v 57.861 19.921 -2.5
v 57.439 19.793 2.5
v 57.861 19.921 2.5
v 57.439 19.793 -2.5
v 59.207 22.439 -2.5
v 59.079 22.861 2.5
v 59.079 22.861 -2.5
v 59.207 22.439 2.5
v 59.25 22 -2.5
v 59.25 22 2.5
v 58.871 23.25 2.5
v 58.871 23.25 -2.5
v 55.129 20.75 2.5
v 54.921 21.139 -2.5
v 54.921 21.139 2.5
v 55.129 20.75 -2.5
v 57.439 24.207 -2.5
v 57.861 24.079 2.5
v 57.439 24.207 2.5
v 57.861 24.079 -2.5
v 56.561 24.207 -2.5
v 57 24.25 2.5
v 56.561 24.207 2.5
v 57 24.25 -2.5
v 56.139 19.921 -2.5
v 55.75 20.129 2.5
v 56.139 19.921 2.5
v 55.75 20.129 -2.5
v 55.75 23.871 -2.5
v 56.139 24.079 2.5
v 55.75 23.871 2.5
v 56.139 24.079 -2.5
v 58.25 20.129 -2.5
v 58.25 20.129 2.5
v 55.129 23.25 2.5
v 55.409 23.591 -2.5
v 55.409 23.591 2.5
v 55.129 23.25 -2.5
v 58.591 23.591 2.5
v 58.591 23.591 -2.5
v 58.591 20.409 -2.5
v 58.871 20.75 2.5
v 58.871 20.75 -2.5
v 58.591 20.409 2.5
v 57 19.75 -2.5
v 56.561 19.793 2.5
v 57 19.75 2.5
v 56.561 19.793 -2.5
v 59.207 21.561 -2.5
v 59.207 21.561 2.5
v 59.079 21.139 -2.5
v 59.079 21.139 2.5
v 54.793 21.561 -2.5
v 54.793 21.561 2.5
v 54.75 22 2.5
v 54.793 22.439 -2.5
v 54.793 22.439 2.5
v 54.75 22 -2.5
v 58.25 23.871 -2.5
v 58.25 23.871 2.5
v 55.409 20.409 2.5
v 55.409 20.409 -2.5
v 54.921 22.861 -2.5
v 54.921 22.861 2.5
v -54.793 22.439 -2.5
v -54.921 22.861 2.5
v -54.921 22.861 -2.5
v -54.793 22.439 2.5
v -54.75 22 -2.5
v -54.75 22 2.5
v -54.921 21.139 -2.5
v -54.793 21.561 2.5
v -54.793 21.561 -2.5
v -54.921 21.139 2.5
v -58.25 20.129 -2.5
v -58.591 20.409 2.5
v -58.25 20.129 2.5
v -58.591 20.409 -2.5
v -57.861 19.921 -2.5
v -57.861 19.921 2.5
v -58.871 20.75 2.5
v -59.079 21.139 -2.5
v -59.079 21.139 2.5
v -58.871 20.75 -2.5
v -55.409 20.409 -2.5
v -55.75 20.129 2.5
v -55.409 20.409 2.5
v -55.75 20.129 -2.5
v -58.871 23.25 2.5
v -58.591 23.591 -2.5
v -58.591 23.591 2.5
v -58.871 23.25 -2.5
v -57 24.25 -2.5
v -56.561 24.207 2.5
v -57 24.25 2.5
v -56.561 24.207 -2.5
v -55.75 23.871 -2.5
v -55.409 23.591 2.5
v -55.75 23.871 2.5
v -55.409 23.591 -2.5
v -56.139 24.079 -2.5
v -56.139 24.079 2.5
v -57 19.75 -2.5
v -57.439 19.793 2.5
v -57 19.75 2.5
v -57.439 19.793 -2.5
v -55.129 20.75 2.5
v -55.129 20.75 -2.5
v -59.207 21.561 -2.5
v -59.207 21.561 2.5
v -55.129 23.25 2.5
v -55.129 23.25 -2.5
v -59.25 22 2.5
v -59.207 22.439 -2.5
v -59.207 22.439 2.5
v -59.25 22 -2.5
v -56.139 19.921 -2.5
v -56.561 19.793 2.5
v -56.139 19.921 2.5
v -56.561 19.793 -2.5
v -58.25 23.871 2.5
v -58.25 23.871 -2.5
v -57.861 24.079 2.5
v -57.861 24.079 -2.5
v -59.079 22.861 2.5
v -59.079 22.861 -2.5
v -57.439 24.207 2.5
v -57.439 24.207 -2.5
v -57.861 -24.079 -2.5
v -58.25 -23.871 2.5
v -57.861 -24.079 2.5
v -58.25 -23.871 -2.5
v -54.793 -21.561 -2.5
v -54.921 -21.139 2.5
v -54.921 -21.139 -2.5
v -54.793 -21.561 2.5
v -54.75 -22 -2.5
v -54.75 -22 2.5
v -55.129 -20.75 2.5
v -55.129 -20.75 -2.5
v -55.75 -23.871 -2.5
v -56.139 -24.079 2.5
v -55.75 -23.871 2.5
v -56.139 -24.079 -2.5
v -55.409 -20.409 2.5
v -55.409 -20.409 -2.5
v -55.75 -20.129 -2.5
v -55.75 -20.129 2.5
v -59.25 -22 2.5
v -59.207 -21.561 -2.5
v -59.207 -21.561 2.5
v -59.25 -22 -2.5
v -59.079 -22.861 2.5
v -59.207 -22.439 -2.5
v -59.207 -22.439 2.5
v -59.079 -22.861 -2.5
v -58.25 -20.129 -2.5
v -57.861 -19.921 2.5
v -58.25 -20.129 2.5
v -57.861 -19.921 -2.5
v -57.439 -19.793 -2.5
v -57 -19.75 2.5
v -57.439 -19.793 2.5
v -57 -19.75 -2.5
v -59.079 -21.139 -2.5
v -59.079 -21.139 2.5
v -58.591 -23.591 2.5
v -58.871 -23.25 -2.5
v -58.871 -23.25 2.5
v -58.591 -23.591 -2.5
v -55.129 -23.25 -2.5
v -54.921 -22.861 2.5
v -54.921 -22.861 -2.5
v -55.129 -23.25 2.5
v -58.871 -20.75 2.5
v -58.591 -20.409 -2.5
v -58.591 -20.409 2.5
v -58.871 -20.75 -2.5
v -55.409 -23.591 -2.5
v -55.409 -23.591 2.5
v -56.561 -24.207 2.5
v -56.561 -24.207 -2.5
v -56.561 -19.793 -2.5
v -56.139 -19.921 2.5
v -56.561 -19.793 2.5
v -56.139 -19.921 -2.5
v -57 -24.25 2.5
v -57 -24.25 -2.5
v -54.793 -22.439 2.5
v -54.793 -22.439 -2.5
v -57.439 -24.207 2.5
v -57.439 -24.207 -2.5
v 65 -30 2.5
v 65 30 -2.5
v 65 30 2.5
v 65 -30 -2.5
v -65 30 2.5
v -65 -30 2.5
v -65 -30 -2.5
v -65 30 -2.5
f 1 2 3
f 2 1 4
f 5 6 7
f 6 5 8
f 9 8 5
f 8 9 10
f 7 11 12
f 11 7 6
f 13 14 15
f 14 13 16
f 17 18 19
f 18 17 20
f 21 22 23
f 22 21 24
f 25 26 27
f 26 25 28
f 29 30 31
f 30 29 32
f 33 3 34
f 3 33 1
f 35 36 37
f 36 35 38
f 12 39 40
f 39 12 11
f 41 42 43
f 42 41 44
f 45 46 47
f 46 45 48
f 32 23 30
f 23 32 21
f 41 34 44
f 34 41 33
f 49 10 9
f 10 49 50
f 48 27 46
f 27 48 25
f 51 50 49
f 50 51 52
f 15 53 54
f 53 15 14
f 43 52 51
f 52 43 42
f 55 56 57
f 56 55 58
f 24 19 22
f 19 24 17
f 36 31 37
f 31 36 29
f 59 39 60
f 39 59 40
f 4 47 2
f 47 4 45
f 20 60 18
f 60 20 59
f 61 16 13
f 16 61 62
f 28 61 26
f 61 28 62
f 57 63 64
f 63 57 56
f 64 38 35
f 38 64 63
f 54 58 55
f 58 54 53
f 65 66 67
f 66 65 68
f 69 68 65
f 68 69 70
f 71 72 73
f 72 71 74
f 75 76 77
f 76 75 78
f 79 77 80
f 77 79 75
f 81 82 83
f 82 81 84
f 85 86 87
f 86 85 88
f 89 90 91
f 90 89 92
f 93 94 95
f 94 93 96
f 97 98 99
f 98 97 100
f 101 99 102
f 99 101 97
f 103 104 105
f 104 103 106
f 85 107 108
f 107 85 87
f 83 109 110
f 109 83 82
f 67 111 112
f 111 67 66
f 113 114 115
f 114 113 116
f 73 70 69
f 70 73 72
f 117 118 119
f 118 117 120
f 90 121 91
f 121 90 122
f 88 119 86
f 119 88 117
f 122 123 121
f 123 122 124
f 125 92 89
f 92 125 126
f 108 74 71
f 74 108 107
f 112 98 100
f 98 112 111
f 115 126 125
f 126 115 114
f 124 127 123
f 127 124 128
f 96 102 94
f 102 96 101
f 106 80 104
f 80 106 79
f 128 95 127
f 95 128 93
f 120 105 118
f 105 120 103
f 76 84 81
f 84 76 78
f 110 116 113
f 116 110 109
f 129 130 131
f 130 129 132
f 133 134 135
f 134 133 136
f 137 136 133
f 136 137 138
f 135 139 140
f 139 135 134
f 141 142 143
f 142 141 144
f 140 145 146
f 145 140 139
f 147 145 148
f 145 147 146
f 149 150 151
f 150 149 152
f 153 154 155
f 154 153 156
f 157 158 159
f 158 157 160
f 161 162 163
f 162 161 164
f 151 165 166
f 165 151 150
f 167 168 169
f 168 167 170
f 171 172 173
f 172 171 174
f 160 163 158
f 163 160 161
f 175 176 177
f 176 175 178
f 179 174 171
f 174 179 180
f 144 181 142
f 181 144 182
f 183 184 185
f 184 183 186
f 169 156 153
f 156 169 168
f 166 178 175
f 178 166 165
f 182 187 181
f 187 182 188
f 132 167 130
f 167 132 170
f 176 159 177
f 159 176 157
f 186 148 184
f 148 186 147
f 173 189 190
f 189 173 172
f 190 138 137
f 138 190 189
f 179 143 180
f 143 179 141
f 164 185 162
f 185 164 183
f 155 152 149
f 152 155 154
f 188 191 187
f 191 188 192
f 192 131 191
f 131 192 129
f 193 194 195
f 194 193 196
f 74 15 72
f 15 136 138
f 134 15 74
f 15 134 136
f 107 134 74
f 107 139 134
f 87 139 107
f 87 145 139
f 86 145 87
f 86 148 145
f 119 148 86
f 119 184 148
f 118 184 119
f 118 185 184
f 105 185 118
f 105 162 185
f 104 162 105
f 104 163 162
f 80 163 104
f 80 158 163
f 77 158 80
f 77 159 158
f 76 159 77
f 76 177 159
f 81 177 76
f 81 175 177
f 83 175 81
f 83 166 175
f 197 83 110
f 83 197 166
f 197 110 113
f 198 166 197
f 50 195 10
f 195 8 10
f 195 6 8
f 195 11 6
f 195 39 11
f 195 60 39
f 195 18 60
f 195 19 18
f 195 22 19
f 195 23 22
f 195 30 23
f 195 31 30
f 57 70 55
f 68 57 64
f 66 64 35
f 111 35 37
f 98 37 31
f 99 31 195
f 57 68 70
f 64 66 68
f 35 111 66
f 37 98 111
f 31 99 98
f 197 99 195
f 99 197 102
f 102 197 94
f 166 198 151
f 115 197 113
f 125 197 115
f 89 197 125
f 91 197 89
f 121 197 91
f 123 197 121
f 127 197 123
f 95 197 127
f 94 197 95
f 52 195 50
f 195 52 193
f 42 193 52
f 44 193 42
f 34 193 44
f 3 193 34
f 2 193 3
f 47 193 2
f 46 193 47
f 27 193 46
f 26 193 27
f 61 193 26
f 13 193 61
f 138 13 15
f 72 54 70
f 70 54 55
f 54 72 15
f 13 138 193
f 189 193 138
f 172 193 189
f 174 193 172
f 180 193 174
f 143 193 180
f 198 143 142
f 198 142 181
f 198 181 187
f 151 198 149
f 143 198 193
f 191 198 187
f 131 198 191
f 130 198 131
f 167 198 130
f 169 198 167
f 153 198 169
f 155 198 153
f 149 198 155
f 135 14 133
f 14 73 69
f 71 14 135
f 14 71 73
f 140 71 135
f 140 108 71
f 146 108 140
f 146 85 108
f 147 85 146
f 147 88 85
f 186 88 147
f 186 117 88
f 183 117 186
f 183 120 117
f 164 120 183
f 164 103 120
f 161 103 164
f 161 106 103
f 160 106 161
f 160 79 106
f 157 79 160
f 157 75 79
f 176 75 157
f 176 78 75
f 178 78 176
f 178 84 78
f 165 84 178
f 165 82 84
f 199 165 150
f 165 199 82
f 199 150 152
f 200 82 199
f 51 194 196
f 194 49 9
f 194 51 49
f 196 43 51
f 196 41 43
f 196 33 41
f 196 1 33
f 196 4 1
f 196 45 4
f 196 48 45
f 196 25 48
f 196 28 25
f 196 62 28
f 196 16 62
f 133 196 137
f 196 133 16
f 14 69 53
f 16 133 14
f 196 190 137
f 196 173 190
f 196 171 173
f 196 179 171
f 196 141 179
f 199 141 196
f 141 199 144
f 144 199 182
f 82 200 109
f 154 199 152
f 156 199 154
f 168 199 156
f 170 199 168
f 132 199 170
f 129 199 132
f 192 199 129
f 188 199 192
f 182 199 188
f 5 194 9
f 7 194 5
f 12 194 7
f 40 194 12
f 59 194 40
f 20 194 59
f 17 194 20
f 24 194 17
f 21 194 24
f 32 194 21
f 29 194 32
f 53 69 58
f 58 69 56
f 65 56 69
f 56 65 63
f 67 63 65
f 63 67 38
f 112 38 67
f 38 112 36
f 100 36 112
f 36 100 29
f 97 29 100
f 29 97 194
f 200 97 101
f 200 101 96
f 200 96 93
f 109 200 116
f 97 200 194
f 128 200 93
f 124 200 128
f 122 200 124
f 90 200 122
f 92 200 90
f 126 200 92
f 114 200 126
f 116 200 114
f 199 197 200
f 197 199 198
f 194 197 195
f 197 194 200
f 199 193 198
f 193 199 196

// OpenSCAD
$fn = 32;

// ----------------------------------------------------------------------
// Corner plate 130 x 60 x 5
// 3 holes, centres taken from the edge offset
// ----------------------------------------------------------------------

// --- parameters (mm) ---
plate = [130, 60, 5];  // overall size (x, y, z)
holes = 3;             // number of holes the drawing asks for
hole_d = 4.5;          // hole diameter
edge = 8;              // hole centre offset from the plate edge

// --- derived feature positions (mm) ---
corner_x = plate[0] / 2 - edge;  // = 57   corner hole X
corner_y = plate[1] / 2 - edge;  // = 22   corner hole Y
feature_centers = [
  [corner_x, corner_y],
  [-corner_x, corner_y],
  [-corner_x, -corner_y]
];   // hole centres the loop below drills

// plate outline, every hole drilled through with the same cutters
difference() {
  cube(plate, center = true);
  for (centre = feature_centers)
    translate([centre[0], centre[1], 0])
      cylinder(d = hole_d, h = plate[2] + 2, center = true);
}
